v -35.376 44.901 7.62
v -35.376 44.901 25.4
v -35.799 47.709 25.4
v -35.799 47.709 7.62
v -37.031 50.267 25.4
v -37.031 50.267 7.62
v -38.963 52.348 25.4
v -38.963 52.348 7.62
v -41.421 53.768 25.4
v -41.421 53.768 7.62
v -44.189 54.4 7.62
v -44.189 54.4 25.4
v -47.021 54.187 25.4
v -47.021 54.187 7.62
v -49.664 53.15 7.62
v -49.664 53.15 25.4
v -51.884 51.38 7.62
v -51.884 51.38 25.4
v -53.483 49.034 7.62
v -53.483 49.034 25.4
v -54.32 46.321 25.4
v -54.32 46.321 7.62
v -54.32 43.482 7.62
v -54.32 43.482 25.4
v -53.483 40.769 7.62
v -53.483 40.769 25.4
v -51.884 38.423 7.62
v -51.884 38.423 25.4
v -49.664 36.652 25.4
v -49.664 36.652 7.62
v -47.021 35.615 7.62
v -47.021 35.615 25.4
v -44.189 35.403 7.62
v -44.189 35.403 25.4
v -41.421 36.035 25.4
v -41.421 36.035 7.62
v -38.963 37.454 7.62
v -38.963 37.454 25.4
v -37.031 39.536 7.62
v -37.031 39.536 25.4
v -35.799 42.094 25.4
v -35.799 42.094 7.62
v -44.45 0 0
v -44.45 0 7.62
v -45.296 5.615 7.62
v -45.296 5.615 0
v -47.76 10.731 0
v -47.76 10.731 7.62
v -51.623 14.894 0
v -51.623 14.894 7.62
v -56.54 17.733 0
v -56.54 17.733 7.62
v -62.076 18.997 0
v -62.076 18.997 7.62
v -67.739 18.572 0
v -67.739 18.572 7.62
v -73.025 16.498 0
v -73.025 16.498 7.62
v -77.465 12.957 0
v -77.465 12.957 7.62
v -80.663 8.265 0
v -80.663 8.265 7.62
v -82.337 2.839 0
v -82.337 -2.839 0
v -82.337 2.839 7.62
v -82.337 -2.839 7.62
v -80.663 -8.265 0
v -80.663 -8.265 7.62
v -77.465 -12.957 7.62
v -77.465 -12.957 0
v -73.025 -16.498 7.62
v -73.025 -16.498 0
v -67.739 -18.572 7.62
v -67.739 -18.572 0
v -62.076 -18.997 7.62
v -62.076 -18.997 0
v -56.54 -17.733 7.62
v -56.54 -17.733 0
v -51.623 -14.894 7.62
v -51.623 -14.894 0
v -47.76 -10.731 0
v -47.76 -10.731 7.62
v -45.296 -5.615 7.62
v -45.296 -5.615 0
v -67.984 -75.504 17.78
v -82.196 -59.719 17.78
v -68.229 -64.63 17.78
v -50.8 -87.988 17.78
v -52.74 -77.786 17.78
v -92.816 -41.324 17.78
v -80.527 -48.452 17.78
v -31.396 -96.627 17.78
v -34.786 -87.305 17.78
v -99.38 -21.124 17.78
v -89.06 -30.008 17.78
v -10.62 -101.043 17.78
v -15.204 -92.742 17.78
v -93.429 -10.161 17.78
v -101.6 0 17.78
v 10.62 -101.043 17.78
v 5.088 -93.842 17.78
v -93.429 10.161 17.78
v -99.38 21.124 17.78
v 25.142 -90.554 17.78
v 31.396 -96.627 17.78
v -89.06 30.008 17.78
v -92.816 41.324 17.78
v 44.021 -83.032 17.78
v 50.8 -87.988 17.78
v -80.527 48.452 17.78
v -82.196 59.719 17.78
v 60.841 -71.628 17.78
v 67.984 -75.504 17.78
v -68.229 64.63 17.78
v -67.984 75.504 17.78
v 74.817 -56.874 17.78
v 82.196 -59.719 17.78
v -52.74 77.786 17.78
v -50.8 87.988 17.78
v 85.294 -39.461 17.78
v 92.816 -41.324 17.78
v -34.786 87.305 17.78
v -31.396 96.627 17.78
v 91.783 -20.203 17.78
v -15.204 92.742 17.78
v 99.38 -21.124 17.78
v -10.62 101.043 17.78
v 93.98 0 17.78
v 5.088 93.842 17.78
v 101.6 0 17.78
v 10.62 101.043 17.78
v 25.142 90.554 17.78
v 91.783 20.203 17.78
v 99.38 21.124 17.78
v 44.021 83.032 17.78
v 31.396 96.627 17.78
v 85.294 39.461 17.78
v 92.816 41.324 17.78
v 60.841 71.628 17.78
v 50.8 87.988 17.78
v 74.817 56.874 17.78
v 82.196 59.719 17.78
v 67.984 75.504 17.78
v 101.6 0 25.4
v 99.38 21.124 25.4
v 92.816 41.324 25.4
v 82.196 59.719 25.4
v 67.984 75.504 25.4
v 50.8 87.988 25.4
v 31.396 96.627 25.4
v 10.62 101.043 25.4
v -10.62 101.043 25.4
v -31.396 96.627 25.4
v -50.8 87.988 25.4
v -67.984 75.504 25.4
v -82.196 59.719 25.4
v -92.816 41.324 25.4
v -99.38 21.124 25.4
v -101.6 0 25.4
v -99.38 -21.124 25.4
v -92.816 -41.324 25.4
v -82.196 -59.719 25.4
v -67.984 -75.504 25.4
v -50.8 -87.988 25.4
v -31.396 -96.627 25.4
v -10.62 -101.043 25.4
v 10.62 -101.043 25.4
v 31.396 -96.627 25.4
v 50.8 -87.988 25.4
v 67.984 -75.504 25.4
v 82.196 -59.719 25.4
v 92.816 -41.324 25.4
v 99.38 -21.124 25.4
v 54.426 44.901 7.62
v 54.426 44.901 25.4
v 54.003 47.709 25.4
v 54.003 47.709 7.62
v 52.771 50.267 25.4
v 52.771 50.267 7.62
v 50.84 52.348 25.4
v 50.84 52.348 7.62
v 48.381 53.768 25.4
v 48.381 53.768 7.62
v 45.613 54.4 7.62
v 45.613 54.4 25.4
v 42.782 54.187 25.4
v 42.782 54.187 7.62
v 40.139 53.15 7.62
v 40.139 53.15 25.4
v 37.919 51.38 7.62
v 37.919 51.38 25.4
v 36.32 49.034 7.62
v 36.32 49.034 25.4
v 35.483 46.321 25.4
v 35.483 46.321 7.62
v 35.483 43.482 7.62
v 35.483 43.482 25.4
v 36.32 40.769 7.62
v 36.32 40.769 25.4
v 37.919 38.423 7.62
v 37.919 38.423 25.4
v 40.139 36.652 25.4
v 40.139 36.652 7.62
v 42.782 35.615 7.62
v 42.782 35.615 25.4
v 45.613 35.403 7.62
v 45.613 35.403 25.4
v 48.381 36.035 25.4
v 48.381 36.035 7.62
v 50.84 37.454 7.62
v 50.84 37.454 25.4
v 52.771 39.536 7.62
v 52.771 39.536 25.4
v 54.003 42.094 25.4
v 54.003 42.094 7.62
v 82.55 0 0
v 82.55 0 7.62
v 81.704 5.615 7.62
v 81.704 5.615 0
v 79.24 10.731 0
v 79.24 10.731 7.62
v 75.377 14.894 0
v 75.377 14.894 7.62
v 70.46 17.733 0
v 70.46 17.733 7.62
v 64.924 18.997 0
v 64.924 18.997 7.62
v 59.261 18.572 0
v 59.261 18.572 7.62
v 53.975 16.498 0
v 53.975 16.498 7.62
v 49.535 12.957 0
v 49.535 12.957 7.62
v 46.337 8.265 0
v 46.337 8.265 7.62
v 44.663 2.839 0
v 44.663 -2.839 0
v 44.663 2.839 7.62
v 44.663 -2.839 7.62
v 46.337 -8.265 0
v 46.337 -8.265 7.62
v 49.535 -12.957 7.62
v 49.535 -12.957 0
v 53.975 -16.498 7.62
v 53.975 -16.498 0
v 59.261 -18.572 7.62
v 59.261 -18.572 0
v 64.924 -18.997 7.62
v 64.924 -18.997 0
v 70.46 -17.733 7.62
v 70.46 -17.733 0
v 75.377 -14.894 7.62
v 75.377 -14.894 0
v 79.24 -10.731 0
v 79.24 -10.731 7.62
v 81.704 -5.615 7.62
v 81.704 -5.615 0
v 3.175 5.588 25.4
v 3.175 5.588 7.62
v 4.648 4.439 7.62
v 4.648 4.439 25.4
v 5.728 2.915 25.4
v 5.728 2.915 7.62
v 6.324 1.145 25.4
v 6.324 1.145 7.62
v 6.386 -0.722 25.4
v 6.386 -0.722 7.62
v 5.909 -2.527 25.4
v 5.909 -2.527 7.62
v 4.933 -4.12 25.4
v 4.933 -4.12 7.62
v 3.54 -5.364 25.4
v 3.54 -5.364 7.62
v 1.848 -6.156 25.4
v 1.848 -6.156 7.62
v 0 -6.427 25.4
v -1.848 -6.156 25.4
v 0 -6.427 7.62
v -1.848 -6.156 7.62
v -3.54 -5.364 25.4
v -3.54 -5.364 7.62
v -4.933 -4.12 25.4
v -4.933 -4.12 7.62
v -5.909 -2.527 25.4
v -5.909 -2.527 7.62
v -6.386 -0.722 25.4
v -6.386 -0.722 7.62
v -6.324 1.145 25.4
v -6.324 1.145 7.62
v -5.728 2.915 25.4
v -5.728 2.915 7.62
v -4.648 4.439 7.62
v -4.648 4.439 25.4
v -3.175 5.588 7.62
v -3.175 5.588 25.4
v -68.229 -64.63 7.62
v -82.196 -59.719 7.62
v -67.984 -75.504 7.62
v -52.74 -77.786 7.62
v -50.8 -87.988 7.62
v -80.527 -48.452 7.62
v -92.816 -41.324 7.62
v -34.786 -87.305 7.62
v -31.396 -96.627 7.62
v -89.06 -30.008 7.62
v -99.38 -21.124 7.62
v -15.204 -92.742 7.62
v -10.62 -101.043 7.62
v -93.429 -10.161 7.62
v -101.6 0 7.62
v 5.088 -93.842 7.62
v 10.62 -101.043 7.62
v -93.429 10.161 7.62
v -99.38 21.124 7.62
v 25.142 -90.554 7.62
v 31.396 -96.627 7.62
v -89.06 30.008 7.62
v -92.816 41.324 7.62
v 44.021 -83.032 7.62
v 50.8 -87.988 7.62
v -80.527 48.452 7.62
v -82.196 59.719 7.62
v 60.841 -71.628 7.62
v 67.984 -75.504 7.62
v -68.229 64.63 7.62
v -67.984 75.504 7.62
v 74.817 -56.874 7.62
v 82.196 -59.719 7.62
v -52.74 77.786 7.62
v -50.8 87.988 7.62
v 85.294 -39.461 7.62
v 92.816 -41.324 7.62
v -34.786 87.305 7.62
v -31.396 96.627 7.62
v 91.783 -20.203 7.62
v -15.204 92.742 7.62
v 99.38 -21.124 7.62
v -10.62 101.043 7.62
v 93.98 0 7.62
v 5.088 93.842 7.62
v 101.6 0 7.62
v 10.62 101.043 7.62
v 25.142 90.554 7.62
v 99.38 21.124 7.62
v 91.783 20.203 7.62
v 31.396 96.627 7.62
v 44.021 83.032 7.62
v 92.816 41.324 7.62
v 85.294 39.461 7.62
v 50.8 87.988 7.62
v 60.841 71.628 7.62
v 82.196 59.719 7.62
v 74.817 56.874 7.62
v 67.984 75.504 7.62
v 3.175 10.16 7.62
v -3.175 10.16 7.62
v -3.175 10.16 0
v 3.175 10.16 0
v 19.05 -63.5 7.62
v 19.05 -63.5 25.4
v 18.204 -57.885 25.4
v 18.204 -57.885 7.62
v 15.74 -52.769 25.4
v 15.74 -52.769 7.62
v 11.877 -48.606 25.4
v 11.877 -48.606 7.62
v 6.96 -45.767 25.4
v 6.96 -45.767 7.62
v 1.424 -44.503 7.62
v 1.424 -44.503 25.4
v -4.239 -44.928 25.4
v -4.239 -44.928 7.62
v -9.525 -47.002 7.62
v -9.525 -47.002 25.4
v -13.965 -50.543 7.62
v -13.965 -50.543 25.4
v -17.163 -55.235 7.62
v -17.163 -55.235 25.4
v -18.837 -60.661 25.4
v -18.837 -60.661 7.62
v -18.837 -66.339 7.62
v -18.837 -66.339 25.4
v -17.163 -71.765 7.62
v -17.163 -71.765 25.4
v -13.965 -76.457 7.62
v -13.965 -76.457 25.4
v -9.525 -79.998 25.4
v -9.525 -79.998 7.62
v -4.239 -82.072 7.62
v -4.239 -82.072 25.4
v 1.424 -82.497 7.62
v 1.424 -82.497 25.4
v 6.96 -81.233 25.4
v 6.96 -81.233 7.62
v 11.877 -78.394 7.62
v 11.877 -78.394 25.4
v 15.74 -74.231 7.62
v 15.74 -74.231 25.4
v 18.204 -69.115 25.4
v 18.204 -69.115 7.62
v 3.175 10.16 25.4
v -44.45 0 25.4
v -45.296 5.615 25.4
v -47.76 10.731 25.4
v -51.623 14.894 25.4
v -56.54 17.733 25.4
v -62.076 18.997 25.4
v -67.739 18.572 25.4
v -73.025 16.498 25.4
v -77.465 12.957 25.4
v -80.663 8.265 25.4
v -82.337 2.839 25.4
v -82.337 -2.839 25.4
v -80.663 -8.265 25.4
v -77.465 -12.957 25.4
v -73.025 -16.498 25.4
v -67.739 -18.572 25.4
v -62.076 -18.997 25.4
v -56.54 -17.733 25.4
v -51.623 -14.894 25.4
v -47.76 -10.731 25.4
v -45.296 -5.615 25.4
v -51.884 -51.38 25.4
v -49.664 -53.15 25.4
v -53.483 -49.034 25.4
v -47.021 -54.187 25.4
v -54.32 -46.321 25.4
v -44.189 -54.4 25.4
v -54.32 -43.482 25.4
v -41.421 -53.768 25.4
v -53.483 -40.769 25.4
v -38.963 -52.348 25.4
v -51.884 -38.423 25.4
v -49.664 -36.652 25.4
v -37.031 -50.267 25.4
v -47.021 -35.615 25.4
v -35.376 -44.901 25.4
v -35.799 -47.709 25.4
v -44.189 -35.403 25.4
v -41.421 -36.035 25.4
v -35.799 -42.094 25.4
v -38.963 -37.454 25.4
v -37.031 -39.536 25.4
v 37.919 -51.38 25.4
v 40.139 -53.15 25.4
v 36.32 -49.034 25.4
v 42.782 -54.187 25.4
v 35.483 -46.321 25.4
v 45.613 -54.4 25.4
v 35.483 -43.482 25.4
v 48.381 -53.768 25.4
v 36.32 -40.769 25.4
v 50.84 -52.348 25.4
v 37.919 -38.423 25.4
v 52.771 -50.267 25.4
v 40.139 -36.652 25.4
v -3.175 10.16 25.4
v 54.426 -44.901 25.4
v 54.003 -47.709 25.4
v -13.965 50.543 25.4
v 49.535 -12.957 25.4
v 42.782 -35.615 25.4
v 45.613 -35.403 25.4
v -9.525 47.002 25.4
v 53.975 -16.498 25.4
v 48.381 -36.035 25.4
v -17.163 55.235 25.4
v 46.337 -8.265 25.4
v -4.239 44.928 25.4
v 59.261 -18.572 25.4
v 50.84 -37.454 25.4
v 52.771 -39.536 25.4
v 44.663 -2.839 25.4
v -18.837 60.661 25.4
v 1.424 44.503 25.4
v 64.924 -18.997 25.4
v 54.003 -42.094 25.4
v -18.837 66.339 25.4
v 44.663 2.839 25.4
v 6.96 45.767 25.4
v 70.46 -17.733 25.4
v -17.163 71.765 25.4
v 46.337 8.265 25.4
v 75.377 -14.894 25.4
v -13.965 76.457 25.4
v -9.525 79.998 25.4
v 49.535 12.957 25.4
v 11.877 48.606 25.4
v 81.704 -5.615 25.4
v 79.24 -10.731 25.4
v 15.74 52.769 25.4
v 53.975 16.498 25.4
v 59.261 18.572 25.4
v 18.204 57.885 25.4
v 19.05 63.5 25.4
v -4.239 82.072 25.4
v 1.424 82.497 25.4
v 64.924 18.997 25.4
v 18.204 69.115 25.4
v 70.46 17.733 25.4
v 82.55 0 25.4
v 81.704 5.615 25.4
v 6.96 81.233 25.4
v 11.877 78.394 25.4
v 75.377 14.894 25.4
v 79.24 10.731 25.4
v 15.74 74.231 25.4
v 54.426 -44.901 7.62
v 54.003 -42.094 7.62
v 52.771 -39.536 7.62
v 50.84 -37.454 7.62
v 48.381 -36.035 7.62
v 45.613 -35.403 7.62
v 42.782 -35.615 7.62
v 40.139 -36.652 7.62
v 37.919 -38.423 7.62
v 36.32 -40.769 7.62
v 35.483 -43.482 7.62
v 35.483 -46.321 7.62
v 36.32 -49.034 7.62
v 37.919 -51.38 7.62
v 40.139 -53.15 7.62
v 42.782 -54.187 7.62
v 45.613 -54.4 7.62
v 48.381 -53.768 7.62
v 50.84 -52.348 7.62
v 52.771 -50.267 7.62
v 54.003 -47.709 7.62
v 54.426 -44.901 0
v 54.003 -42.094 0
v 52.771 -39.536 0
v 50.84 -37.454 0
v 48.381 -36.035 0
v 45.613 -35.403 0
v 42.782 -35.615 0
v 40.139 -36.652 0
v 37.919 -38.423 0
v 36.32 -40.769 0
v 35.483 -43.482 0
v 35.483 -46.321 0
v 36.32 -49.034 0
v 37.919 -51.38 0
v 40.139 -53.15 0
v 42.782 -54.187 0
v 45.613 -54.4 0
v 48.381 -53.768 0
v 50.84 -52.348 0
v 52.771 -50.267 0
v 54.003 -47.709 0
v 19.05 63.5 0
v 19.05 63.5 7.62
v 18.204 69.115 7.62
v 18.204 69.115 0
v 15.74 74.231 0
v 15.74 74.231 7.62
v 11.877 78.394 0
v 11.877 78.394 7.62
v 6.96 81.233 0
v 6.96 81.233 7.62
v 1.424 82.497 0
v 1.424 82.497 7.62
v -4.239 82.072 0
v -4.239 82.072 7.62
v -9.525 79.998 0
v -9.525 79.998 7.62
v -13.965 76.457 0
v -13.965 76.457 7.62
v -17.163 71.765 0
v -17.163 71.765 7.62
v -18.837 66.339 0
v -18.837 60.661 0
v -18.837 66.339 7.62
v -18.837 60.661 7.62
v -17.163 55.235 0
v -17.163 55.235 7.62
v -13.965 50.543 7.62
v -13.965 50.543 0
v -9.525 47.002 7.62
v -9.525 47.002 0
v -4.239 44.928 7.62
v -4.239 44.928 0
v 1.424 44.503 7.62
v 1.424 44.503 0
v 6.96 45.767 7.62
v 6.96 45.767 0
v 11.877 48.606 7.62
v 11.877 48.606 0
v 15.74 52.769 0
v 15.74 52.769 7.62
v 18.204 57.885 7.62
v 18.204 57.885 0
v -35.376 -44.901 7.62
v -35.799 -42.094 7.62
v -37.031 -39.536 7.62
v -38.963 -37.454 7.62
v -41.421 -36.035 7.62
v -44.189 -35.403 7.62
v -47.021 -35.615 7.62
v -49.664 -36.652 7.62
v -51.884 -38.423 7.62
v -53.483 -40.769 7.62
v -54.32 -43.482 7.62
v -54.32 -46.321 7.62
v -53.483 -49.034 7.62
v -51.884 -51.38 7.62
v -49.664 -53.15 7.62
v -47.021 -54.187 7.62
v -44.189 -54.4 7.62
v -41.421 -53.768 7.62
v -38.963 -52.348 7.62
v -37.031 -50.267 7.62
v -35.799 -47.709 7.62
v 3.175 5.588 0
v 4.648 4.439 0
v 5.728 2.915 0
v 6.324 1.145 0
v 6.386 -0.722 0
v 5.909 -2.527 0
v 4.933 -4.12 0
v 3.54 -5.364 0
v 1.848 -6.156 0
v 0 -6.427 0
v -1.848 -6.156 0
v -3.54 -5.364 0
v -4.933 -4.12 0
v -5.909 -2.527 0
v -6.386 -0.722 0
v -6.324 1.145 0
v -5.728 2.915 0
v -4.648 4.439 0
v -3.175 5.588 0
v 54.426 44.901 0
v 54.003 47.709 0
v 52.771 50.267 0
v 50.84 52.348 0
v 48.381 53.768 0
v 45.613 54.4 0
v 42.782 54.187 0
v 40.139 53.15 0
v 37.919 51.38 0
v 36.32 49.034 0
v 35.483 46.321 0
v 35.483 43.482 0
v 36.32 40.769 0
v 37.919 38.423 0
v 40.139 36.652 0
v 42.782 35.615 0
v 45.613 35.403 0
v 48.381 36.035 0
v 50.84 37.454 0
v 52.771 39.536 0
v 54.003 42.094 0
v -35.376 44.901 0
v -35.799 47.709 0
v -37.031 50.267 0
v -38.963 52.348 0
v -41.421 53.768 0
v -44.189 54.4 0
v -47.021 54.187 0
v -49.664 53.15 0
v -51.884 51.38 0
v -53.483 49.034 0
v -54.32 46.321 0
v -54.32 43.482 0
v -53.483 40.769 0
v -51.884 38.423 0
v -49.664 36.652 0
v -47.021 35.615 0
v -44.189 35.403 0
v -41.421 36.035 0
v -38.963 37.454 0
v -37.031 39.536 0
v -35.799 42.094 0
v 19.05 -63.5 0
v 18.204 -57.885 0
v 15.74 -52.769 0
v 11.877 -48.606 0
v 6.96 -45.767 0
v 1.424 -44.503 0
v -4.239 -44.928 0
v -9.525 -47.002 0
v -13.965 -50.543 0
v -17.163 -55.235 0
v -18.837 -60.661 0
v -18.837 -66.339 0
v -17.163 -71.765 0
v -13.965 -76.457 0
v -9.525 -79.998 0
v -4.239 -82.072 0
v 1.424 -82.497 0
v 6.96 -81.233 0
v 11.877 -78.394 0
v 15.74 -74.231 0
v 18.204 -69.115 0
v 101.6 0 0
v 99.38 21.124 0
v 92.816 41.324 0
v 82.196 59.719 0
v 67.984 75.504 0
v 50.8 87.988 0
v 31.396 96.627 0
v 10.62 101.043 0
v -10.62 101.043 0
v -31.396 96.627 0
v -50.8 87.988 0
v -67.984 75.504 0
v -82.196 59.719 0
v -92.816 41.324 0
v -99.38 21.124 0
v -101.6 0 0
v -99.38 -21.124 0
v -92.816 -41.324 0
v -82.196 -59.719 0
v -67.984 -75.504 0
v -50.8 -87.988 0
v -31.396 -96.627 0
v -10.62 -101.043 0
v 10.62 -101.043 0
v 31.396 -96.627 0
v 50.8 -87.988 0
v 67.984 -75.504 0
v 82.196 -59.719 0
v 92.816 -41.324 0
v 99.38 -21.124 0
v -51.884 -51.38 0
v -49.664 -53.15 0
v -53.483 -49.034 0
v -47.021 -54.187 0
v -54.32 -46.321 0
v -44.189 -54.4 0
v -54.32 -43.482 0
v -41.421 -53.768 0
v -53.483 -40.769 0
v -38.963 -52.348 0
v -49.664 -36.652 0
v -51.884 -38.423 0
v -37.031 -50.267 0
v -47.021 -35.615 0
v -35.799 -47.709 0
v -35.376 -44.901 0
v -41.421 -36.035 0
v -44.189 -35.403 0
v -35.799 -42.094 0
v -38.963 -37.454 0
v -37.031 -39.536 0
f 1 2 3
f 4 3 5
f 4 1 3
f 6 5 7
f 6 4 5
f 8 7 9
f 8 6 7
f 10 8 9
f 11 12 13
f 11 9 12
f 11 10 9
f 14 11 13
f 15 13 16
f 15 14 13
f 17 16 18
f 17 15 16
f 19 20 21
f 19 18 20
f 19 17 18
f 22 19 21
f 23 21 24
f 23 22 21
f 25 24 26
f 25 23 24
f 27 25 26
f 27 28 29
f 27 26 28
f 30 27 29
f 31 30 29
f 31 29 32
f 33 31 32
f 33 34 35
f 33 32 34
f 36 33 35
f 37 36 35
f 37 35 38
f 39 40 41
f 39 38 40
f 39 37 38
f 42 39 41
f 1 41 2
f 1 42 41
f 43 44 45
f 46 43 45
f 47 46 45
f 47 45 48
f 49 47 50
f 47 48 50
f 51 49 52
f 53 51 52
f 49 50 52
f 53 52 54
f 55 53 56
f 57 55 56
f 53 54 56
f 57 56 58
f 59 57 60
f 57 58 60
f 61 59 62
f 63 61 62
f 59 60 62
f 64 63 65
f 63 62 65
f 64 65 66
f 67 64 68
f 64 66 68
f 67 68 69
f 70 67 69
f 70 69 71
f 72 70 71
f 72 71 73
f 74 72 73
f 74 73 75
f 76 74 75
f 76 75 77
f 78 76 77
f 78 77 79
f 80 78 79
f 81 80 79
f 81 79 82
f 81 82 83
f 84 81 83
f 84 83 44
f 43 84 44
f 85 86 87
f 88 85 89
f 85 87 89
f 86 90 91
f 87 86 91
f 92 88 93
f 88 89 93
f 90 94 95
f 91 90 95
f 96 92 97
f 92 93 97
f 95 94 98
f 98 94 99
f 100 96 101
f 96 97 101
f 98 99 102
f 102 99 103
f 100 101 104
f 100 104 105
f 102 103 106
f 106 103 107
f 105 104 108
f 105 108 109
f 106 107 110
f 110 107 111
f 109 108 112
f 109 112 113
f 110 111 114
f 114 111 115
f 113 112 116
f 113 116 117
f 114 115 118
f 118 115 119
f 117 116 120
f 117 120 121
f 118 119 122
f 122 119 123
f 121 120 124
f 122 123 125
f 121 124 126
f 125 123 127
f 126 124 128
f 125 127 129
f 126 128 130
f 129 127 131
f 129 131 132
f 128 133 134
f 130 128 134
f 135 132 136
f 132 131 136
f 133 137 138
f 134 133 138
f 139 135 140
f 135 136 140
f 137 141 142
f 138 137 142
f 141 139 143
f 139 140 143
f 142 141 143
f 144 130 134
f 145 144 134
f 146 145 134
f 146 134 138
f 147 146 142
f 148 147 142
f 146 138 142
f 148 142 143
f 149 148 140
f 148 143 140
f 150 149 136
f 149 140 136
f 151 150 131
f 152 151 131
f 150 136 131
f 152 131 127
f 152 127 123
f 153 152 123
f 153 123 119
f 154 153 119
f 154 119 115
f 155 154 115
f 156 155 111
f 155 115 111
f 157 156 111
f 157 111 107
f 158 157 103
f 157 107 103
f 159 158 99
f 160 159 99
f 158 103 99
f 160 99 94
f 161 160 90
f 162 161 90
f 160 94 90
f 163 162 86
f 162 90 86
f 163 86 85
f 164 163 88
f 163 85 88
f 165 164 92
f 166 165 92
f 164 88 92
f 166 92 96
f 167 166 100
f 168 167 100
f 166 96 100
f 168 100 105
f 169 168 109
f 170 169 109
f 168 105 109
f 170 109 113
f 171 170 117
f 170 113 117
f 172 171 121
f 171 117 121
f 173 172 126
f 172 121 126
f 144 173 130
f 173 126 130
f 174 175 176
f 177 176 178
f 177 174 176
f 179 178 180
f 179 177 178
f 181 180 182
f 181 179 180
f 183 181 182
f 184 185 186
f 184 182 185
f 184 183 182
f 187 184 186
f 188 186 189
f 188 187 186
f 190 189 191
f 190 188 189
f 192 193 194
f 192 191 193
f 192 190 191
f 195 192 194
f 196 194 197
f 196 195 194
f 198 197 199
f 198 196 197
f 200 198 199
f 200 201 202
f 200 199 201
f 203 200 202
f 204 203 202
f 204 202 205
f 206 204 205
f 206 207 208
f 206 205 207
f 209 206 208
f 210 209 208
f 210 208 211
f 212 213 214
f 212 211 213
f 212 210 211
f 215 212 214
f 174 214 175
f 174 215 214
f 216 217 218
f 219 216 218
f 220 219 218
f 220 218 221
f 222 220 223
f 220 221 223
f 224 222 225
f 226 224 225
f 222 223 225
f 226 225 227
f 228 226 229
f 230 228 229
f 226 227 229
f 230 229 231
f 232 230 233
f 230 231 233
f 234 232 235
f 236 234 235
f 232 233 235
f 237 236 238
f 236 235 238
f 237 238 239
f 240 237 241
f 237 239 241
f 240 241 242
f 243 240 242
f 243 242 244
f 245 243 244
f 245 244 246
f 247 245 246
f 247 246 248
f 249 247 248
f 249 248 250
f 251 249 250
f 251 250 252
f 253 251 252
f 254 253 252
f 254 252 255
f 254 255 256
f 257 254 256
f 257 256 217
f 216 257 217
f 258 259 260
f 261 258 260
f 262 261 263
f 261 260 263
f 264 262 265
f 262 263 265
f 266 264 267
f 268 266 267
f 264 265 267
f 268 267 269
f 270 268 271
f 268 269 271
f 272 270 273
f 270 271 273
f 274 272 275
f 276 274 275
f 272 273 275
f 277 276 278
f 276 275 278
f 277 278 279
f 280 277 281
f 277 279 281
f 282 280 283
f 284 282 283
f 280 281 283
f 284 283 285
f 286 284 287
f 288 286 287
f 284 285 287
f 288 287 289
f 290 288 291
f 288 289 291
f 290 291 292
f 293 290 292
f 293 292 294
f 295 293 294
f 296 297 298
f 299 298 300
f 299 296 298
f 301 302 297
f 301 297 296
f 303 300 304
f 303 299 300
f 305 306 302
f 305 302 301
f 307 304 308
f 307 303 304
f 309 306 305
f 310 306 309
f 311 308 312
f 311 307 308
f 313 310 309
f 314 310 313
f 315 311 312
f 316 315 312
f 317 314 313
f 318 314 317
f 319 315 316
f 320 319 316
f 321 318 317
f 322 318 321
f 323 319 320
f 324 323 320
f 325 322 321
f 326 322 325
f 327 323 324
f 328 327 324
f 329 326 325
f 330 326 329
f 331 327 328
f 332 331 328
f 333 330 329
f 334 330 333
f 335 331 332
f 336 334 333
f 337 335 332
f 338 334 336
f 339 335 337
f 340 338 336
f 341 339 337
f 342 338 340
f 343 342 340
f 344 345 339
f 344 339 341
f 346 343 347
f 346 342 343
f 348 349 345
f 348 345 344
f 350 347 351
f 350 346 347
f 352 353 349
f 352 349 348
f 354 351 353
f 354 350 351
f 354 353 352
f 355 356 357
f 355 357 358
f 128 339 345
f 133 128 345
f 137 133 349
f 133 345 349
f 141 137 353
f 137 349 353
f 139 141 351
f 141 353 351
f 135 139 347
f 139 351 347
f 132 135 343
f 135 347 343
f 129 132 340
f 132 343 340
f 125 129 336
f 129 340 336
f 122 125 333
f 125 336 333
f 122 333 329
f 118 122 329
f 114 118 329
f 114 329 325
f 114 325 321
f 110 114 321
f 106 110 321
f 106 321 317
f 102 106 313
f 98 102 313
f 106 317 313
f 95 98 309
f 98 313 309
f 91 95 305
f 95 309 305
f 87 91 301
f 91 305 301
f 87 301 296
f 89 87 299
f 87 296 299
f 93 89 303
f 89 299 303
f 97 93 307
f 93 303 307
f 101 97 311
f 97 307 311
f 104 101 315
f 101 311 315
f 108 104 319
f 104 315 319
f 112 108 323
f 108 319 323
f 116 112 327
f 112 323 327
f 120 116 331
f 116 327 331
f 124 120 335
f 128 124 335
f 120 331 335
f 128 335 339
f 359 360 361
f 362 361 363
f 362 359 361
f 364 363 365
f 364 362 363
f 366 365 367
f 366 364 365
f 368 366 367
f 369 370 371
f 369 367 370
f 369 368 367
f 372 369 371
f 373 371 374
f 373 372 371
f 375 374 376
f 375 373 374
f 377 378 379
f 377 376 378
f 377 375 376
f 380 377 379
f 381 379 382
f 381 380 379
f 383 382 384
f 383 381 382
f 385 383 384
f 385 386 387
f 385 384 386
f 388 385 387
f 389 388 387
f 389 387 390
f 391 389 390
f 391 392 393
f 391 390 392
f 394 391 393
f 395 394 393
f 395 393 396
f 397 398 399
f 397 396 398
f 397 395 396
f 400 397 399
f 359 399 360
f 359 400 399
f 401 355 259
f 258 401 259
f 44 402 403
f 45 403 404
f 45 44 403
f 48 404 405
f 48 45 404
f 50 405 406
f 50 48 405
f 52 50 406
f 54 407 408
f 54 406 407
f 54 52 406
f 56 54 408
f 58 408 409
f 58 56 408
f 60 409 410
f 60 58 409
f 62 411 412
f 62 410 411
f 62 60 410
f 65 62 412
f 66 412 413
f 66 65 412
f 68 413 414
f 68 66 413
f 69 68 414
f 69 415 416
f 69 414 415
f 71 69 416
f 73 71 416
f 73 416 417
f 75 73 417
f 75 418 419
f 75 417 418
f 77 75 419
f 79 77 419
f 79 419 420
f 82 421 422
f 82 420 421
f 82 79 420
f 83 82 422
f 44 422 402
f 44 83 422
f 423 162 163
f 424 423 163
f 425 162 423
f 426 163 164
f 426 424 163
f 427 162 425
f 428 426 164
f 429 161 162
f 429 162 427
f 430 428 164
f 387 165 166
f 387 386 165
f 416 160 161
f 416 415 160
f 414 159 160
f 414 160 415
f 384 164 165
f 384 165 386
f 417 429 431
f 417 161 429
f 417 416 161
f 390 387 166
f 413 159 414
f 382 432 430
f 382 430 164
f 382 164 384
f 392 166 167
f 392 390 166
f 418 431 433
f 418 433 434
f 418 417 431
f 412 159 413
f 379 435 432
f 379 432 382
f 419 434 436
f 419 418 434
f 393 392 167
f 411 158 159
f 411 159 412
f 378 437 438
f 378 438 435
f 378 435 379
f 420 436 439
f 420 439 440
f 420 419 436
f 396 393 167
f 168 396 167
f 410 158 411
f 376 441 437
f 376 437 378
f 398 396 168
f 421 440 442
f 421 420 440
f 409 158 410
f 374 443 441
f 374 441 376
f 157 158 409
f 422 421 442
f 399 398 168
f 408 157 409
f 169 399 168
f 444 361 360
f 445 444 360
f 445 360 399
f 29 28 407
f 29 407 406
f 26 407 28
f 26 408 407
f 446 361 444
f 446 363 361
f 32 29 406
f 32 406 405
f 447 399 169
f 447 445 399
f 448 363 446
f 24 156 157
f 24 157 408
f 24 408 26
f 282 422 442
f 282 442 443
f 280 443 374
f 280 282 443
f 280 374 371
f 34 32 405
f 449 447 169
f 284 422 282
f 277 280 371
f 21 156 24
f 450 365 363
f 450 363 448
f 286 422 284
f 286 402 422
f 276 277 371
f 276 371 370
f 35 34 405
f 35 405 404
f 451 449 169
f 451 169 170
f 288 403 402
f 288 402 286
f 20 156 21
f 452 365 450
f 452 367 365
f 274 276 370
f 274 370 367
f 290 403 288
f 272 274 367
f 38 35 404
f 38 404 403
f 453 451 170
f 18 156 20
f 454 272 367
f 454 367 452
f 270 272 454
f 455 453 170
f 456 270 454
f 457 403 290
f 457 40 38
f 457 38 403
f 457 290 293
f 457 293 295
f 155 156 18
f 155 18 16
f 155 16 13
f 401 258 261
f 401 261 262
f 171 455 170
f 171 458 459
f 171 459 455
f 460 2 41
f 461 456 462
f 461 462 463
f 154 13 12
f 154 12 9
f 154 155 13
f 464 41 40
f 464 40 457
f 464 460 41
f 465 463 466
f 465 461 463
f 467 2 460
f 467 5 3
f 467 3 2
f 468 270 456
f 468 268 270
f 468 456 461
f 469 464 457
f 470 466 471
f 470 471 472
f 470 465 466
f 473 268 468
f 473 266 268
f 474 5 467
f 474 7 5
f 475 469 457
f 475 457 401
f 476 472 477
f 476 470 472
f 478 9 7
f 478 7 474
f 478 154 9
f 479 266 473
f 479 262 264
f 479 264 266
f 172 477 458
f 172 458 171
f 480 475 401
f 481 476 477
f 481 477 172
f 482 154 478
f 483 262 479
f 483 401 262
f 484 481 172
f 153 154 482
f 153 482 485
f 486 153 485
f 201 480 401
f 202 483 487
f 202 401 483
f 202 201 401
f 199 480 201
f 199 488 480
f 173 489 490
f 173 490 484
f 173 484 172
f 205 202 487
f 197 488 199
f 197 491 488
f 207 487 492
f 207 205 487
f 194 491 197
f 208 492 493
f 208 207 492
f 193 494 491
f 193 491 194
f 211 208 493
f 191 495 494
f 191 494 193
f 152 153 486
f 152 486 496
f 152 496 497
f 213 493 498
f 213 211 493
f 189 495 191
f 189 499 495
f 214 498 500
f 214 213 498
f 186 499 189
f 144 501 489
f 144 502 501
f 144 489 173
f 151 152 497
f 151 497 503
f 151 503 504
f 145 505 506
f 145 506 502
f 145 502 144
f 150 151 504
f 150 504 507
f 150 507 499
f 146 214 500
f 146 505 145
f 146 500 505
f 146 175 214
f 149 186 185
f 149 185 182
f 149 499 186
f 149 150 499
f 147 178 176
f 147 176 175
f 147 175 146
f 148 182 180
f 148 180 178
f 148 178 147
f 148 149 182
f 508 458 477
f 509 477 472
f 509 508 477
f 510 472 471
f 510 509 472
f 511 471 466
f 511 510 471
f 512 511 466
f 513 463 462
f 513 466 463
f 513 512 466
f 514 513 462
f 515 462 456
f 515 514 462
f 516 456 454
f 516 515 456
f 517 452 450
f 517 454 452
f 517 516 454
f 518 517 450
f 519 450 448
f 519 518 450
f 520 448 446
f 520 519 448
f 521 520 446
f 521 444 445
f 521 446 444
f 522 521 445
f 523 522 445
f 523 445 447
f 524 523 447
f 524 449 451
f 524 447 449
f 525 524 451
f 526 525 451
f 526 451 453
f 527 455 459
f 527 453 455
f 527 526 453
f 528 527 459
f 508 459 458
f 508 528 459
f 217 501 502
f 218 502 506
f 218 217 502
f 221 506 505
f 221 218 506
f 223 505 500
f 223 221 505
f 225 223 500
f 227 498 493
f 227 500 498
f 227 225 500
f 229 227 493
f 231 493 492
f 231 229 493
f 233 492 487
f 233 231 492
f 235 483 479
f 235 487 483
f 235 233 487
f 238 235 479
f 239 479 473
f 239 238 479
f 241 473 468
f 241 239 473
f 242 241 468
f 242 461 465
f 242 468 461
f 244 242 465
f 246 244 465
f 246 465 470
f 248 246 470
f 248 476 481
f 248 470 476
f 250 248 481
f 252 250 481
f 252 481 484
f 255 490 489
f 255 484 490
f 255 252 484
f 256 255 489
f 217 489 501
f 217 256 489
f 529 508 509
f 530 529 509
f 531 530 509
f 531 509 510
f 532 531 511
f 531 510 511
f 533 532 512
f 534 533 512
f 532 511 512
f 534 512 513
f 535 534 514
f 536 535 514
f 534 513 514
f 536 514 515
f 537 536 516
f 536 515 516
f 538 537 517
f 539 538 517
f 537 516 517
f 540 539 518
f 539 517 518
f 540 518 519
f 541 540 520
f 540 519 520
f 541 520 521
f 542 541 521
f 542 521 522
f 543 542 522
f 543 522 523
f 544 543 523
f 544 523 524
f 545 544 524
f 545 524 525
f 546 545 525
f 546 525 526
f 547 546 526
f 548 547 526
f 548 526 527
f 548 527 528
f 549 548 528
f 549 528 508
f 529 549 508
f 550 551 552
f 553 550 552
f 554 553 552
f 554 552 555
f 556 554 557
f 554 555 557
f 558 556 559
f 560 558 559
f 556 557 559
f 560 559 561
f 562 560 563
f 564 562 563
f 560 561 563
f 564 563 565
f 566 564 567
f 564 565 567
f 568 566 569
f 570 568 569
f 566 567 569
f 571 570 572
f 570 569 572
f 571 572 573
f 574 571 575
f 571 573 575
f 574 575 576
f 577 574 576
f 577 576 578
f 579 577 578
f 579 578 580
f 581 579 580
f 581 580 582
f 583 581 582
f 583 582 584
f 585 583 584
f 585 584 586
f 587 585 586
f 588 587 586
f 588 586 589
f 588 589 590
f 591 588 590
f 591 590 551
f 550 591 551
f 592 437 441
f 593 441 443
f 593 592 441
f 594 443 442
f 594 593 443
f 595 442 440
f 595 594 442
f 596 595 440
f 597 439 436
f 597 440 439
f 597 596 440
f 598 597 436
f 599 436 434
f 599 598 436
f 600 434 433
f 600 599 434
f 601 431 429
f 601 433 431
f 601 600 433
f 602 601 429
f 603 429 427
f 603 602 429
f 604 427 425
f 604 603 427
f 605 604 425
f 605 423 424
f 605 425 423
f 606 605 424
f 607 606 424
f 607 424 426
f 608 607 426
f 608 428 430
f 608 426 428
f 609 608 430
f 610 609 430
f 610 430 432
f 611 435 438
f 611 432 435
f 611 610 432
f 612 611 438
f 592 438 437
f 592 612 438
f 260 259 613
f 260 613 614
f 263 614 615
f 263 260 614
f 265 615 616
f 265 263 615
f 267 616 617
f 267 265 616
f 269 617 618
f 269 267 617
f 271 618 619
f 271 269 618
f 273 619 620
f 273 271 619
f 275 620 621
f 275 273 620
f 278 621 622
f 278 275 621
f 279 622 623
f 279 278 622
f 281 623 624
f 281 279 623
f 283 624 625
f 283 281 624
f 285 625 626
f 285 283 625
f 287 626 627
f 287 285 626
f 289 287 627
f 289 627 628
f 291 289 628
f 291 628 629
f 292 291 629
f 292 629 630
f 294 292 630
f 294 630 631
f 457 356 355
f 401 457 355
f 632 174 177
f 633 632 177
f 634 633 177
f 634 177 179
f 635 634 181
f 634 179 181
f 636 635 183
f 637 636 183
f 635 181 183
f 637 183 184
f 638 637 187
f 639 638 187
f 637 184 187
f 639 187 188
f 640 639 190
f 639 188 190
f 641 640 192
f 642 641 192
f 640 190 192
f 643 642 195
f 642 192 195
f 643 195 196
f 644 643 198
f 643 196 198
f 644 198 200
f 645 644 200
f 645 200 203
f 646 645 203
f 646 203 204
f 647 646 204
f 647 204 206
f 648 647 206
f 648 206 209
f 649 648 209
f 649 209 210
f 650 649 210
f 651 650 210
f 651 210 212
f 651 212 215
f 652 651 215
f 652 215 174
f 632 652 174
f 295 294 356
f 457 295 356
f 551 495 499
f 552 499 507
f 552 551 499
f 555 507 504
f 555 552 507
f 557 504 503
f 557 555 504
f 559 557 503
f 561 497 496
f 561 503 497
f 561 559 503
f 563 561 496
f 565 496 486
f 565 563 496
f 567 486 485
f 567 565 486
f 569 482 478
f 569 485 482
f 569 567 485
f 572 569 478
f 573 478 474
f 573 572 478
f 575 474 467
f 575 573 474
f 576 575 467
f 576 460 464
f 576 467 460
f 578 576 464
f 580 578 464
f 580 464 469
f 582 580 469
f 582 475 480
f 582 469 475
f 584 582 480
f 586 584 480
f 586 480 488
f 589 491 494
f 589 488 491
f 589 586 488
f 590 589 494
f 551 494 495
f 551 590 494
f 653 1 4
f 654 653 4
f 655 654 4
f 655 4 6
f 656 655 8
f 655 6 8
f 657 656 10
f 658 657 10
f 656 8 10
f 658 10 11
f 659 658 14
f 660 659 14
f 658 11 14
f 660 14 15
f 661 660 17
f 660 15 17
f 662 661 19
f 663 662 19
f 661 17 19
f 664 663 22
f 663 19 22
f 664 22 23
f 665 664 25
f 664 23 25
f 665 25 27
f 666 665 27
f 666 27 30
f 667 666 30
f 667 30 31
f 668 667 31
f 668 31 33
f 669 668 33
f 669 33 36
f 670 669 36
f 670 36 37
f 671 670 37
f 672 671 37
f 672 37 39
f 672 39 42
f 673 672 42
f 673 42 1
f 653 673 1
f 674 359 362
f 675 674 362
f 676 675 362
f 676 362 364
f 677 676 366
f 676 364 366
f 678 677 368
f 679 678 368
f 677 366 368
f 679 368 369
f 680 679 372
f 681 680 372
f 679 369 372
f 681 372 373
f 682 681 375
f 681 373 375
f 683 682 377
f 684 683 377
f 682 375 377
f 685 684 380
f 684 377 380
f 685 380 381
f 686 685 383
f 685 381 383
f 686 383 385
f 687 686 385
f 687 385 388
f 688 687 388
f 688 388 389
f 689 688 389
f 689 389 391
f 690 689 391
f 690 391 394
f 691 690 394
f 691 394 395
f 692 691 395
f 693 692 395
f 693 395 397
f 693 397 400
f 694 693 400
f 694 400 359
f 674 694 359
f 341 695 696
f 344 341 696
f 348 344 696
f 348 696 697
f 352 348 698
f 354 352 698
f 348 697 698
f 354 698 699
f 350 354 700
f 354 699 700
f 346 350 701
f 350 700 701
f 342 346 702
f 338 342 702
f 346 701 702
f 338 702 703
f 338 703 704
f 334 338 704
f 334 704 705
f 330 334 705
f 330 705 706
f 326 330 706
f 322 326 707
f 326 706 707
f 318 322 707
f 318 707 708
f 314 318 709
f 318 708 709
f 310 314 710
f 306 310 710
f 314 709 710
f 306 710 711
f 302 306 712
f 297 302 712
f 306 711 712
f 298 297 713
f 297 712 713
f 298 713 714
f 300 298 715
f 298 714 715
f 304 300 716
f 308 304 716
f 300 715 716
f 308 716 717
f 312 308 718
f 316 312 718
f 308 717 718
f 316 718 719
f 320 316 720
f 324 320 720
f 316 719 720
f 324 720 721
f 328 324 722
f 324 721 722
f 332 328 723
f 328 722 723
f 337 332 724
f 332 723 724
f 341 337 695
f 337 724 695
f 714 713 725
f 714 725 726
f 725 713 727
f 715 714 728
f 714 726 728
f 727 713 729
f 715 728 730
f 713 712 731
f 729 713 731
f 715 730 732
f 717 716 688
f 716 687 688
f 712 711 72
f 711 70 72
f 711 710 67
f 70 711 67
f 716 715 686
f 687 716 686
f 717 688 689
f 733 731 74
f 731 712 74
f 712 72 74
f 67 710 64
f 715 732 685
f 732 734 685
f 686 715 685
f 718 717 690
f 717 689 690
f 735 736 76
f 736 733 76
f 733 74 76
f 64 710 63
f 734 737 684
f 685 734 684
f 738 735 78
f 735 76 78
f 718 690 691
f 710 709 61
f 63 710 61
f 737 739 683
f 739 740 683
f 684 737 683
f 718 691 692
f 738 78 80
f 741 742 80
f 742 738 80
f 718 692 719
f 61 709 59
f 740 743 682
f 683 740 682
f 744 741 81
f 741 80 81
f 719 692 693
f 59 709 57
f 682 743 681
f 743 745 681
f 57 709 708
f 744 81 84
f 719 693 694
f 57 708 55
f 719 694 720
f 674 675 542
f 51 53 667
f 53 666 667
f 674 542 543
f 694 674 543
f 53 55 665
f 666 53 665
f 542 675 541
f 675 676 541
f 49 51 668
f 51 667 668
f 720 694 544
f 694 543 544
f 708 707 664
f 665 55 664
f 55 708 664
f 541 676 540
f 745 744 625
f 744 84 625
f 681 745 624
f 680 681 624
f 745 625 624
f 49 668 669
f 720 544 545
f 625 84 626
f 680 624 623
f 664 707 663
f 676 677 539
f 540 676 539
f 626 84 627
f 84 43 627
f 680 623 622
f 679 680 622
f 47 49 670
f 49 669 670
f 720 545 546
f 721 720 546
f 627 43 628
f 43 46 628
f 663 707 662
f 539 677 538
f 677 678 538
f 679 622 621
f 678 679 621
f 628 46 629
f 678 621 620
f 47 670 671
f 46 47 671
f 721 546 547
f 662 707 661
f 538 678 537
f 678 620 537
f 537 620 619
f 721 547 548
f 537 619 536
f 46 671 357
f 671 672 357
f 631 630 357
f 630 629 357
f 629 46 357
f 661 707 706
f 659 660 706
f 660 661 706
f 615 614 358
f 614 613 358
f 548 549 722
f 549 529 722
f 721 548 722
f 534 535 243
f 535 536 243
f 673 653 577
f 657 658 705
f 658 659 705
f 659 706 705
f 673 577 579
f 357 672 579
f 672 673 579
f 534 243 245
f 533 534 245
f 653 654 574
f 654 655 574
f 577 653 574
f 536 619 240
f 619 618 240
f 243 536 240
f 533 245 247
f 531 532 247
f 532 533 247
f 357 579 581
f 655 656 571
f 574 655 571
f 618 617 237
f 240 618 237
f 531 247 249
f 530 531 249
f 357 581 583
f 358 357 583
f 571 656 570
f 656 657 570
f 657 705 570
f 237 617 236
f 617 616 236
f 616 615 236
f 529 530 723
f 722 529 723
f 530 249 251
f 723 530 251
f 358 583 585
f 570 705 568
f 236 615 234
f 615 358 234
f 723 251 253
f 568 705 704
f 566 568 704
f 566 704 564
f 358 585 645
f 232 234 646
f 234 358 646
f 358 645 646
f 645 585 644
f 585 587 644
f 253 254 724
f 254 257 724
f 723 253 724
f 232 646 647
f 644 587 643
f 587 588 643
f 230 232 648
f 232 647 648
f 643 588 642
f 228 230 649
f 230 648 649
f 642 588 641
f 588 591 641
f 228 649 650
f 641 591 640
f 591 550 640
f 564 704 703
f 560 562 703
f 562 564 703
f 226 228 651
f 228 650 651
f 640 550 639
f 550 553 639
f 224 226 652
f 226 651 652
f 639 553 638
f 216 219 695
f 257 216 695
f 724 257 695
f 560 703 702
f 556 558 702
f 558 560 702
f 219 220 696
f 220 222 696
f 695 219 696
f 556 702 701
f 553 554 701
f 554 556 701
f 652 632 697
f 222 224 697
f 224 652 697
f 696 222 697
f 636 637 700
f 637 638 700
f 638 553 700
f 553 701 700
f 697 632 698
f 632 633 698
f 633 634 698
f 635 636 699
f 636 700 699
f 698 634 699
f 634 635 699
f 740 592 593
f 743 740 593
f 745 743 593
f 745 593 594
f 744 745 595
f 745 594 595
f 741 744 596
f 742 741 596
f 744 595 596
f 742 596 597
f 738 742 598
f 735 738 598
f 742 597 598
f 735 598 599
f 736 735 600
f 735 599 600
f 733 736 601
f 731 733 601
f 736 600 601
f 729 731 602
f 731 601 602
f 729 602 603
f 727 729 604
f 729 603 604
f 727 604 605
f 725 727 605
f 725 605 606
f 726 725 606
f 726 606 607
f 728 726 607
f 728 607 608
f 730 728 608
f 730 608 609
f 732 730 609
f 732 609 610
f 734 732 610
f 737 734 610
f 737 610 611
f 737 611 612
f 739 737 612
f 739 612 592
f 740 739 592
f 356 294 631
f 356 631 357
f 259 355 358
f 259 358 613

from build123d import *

# Parameters (mm, degrees)
SKETCH1_R               = 101.6
BOSS_EXTRUDE1_DEPTH     = 7.62
SKETCH4_R               = 93.98
BOSS_EXTRUDE2_DEPTH     = 10.16
SKETCH5_R               = 101.6
BOSS_EXTRUDE3_DEPTH     = 7.62
CUT_EXTRUDE1_DEPTH      = 145.78
CUT_EXTRUDE1_DEPTH_BACK = 25.4
SKETCH2_R               = 19.05
SKETCH2_R_2             = 9.525
CUT_EXTRUDE2_DEPTH      = 25.4
CUT_EXTRUDE3_DEPTH      = 145.78
CUT_EXTRUDE3_DEPTH_BACK = 145.78


with BuildPart() as part:
    # Sketch1 → Boss-Extrude1 (new body)
    with BuildSketch(Plane.XY):
        Circle(SKETCH1_R)
    extrude(amount=BOSS_EXTRUDE1_DEPTH)

    # Sketch4 → Boss-Extrude2 (add)
    with BuildSketch(Plane.XY.offset(7.62)):
        Circle(SKETCH4_R)
    extrude(amount=BOSS_EXTRUDE2_DEPTH)

    # Sketch5 → Boss-Extrude3 (add)
    with BuildSketch(Plane.XY.offset(17.78)):
        Circle(SKETCH5_R)
    extrude(amount=BOSS_EXTRUDE3_DEPTH)

    # Sketch2 → Cut-Extrude1 (cut, two sides: drawn at the far end of the back side and taken through both)
    with BuildSketch(Plane.XY.offset(7.62).offset(-CUT_EXTRUDE1_DEPTH_BACK)):
        with Locations((-63.5, 0)):
            Circle(SKETCH2_R)
        with Locations((-44.901280605, 44.901280605)):
            Circle(SKETCH2_R_2)
        with Locations((0, 63.5)):
            Circle(SKETCH2_R)
        with Locations((44.901280605, 44.901280605)):
            Circle(SKETCH2_R_2)
        with Locations((63.5, 0)):
            Circle(SKETCH2_R)
        with Locations((44.901280605, -44.901280605)):
            Circle(SKETCH2_R_2)
        with Locations((0, -63.5)):
            Circle(SKETCH2_R)
        with Locations((-44.901280605, -44.901280605)):
            Circle(SKETCH2_R_2)
    extrude(amount=CUT_EXTRUDE1_DEPTH + CUT_EXTRUDE1_DEPTH_BACK, mode=Mode.SUBTRACT)

    # Sketch3 → Cut-Extrude2 (cut)
    with BuildSketch(Plane.XY.offset(7.62)):
        with BuildLine():
            Line((-3.175, 5.588), (-3.175, 10.16))
            Line((-3.175, 10.16), (3.175, 10.16))
            Line((3.175, 10.16), (3.175, 5.588))
            ThreePointArc((3.175, 5.588), (0, -6.427003112), (-3.175, 5.588))
        make_face()
    extrude(amount=-CUT_EXTRUDE2_DEPTH, mode=Mode.SUBTRACT)

    # Sketch3<2> → Cut-Extrude3 (cut, two sides: drawn at the far end of the back side and taken through both)
    with BuildSketch(Plane.XY.offset(7.62).offset(-CUT_EXTRUDE3_DEPTH_BACK)):
        with BuildLine():
            Line((-3.175, 5.588), (-3.175, 10.16))
            Line((-3.175, 10.16), (3.175, 10.16))
            Line((3.175, 10.16), (3.175, 5.588))
            ThreePointArc((3.175, 5.588), (0, -6.427003112), (-3.175, 5.588))
        make_face()
    extrude(amount=CUT_EXTRUDE3_DEPTH + CUT_EXTRUDE3_DEPTH_BACK, mode=Mode.SUBTRACT)


solid = part.part
